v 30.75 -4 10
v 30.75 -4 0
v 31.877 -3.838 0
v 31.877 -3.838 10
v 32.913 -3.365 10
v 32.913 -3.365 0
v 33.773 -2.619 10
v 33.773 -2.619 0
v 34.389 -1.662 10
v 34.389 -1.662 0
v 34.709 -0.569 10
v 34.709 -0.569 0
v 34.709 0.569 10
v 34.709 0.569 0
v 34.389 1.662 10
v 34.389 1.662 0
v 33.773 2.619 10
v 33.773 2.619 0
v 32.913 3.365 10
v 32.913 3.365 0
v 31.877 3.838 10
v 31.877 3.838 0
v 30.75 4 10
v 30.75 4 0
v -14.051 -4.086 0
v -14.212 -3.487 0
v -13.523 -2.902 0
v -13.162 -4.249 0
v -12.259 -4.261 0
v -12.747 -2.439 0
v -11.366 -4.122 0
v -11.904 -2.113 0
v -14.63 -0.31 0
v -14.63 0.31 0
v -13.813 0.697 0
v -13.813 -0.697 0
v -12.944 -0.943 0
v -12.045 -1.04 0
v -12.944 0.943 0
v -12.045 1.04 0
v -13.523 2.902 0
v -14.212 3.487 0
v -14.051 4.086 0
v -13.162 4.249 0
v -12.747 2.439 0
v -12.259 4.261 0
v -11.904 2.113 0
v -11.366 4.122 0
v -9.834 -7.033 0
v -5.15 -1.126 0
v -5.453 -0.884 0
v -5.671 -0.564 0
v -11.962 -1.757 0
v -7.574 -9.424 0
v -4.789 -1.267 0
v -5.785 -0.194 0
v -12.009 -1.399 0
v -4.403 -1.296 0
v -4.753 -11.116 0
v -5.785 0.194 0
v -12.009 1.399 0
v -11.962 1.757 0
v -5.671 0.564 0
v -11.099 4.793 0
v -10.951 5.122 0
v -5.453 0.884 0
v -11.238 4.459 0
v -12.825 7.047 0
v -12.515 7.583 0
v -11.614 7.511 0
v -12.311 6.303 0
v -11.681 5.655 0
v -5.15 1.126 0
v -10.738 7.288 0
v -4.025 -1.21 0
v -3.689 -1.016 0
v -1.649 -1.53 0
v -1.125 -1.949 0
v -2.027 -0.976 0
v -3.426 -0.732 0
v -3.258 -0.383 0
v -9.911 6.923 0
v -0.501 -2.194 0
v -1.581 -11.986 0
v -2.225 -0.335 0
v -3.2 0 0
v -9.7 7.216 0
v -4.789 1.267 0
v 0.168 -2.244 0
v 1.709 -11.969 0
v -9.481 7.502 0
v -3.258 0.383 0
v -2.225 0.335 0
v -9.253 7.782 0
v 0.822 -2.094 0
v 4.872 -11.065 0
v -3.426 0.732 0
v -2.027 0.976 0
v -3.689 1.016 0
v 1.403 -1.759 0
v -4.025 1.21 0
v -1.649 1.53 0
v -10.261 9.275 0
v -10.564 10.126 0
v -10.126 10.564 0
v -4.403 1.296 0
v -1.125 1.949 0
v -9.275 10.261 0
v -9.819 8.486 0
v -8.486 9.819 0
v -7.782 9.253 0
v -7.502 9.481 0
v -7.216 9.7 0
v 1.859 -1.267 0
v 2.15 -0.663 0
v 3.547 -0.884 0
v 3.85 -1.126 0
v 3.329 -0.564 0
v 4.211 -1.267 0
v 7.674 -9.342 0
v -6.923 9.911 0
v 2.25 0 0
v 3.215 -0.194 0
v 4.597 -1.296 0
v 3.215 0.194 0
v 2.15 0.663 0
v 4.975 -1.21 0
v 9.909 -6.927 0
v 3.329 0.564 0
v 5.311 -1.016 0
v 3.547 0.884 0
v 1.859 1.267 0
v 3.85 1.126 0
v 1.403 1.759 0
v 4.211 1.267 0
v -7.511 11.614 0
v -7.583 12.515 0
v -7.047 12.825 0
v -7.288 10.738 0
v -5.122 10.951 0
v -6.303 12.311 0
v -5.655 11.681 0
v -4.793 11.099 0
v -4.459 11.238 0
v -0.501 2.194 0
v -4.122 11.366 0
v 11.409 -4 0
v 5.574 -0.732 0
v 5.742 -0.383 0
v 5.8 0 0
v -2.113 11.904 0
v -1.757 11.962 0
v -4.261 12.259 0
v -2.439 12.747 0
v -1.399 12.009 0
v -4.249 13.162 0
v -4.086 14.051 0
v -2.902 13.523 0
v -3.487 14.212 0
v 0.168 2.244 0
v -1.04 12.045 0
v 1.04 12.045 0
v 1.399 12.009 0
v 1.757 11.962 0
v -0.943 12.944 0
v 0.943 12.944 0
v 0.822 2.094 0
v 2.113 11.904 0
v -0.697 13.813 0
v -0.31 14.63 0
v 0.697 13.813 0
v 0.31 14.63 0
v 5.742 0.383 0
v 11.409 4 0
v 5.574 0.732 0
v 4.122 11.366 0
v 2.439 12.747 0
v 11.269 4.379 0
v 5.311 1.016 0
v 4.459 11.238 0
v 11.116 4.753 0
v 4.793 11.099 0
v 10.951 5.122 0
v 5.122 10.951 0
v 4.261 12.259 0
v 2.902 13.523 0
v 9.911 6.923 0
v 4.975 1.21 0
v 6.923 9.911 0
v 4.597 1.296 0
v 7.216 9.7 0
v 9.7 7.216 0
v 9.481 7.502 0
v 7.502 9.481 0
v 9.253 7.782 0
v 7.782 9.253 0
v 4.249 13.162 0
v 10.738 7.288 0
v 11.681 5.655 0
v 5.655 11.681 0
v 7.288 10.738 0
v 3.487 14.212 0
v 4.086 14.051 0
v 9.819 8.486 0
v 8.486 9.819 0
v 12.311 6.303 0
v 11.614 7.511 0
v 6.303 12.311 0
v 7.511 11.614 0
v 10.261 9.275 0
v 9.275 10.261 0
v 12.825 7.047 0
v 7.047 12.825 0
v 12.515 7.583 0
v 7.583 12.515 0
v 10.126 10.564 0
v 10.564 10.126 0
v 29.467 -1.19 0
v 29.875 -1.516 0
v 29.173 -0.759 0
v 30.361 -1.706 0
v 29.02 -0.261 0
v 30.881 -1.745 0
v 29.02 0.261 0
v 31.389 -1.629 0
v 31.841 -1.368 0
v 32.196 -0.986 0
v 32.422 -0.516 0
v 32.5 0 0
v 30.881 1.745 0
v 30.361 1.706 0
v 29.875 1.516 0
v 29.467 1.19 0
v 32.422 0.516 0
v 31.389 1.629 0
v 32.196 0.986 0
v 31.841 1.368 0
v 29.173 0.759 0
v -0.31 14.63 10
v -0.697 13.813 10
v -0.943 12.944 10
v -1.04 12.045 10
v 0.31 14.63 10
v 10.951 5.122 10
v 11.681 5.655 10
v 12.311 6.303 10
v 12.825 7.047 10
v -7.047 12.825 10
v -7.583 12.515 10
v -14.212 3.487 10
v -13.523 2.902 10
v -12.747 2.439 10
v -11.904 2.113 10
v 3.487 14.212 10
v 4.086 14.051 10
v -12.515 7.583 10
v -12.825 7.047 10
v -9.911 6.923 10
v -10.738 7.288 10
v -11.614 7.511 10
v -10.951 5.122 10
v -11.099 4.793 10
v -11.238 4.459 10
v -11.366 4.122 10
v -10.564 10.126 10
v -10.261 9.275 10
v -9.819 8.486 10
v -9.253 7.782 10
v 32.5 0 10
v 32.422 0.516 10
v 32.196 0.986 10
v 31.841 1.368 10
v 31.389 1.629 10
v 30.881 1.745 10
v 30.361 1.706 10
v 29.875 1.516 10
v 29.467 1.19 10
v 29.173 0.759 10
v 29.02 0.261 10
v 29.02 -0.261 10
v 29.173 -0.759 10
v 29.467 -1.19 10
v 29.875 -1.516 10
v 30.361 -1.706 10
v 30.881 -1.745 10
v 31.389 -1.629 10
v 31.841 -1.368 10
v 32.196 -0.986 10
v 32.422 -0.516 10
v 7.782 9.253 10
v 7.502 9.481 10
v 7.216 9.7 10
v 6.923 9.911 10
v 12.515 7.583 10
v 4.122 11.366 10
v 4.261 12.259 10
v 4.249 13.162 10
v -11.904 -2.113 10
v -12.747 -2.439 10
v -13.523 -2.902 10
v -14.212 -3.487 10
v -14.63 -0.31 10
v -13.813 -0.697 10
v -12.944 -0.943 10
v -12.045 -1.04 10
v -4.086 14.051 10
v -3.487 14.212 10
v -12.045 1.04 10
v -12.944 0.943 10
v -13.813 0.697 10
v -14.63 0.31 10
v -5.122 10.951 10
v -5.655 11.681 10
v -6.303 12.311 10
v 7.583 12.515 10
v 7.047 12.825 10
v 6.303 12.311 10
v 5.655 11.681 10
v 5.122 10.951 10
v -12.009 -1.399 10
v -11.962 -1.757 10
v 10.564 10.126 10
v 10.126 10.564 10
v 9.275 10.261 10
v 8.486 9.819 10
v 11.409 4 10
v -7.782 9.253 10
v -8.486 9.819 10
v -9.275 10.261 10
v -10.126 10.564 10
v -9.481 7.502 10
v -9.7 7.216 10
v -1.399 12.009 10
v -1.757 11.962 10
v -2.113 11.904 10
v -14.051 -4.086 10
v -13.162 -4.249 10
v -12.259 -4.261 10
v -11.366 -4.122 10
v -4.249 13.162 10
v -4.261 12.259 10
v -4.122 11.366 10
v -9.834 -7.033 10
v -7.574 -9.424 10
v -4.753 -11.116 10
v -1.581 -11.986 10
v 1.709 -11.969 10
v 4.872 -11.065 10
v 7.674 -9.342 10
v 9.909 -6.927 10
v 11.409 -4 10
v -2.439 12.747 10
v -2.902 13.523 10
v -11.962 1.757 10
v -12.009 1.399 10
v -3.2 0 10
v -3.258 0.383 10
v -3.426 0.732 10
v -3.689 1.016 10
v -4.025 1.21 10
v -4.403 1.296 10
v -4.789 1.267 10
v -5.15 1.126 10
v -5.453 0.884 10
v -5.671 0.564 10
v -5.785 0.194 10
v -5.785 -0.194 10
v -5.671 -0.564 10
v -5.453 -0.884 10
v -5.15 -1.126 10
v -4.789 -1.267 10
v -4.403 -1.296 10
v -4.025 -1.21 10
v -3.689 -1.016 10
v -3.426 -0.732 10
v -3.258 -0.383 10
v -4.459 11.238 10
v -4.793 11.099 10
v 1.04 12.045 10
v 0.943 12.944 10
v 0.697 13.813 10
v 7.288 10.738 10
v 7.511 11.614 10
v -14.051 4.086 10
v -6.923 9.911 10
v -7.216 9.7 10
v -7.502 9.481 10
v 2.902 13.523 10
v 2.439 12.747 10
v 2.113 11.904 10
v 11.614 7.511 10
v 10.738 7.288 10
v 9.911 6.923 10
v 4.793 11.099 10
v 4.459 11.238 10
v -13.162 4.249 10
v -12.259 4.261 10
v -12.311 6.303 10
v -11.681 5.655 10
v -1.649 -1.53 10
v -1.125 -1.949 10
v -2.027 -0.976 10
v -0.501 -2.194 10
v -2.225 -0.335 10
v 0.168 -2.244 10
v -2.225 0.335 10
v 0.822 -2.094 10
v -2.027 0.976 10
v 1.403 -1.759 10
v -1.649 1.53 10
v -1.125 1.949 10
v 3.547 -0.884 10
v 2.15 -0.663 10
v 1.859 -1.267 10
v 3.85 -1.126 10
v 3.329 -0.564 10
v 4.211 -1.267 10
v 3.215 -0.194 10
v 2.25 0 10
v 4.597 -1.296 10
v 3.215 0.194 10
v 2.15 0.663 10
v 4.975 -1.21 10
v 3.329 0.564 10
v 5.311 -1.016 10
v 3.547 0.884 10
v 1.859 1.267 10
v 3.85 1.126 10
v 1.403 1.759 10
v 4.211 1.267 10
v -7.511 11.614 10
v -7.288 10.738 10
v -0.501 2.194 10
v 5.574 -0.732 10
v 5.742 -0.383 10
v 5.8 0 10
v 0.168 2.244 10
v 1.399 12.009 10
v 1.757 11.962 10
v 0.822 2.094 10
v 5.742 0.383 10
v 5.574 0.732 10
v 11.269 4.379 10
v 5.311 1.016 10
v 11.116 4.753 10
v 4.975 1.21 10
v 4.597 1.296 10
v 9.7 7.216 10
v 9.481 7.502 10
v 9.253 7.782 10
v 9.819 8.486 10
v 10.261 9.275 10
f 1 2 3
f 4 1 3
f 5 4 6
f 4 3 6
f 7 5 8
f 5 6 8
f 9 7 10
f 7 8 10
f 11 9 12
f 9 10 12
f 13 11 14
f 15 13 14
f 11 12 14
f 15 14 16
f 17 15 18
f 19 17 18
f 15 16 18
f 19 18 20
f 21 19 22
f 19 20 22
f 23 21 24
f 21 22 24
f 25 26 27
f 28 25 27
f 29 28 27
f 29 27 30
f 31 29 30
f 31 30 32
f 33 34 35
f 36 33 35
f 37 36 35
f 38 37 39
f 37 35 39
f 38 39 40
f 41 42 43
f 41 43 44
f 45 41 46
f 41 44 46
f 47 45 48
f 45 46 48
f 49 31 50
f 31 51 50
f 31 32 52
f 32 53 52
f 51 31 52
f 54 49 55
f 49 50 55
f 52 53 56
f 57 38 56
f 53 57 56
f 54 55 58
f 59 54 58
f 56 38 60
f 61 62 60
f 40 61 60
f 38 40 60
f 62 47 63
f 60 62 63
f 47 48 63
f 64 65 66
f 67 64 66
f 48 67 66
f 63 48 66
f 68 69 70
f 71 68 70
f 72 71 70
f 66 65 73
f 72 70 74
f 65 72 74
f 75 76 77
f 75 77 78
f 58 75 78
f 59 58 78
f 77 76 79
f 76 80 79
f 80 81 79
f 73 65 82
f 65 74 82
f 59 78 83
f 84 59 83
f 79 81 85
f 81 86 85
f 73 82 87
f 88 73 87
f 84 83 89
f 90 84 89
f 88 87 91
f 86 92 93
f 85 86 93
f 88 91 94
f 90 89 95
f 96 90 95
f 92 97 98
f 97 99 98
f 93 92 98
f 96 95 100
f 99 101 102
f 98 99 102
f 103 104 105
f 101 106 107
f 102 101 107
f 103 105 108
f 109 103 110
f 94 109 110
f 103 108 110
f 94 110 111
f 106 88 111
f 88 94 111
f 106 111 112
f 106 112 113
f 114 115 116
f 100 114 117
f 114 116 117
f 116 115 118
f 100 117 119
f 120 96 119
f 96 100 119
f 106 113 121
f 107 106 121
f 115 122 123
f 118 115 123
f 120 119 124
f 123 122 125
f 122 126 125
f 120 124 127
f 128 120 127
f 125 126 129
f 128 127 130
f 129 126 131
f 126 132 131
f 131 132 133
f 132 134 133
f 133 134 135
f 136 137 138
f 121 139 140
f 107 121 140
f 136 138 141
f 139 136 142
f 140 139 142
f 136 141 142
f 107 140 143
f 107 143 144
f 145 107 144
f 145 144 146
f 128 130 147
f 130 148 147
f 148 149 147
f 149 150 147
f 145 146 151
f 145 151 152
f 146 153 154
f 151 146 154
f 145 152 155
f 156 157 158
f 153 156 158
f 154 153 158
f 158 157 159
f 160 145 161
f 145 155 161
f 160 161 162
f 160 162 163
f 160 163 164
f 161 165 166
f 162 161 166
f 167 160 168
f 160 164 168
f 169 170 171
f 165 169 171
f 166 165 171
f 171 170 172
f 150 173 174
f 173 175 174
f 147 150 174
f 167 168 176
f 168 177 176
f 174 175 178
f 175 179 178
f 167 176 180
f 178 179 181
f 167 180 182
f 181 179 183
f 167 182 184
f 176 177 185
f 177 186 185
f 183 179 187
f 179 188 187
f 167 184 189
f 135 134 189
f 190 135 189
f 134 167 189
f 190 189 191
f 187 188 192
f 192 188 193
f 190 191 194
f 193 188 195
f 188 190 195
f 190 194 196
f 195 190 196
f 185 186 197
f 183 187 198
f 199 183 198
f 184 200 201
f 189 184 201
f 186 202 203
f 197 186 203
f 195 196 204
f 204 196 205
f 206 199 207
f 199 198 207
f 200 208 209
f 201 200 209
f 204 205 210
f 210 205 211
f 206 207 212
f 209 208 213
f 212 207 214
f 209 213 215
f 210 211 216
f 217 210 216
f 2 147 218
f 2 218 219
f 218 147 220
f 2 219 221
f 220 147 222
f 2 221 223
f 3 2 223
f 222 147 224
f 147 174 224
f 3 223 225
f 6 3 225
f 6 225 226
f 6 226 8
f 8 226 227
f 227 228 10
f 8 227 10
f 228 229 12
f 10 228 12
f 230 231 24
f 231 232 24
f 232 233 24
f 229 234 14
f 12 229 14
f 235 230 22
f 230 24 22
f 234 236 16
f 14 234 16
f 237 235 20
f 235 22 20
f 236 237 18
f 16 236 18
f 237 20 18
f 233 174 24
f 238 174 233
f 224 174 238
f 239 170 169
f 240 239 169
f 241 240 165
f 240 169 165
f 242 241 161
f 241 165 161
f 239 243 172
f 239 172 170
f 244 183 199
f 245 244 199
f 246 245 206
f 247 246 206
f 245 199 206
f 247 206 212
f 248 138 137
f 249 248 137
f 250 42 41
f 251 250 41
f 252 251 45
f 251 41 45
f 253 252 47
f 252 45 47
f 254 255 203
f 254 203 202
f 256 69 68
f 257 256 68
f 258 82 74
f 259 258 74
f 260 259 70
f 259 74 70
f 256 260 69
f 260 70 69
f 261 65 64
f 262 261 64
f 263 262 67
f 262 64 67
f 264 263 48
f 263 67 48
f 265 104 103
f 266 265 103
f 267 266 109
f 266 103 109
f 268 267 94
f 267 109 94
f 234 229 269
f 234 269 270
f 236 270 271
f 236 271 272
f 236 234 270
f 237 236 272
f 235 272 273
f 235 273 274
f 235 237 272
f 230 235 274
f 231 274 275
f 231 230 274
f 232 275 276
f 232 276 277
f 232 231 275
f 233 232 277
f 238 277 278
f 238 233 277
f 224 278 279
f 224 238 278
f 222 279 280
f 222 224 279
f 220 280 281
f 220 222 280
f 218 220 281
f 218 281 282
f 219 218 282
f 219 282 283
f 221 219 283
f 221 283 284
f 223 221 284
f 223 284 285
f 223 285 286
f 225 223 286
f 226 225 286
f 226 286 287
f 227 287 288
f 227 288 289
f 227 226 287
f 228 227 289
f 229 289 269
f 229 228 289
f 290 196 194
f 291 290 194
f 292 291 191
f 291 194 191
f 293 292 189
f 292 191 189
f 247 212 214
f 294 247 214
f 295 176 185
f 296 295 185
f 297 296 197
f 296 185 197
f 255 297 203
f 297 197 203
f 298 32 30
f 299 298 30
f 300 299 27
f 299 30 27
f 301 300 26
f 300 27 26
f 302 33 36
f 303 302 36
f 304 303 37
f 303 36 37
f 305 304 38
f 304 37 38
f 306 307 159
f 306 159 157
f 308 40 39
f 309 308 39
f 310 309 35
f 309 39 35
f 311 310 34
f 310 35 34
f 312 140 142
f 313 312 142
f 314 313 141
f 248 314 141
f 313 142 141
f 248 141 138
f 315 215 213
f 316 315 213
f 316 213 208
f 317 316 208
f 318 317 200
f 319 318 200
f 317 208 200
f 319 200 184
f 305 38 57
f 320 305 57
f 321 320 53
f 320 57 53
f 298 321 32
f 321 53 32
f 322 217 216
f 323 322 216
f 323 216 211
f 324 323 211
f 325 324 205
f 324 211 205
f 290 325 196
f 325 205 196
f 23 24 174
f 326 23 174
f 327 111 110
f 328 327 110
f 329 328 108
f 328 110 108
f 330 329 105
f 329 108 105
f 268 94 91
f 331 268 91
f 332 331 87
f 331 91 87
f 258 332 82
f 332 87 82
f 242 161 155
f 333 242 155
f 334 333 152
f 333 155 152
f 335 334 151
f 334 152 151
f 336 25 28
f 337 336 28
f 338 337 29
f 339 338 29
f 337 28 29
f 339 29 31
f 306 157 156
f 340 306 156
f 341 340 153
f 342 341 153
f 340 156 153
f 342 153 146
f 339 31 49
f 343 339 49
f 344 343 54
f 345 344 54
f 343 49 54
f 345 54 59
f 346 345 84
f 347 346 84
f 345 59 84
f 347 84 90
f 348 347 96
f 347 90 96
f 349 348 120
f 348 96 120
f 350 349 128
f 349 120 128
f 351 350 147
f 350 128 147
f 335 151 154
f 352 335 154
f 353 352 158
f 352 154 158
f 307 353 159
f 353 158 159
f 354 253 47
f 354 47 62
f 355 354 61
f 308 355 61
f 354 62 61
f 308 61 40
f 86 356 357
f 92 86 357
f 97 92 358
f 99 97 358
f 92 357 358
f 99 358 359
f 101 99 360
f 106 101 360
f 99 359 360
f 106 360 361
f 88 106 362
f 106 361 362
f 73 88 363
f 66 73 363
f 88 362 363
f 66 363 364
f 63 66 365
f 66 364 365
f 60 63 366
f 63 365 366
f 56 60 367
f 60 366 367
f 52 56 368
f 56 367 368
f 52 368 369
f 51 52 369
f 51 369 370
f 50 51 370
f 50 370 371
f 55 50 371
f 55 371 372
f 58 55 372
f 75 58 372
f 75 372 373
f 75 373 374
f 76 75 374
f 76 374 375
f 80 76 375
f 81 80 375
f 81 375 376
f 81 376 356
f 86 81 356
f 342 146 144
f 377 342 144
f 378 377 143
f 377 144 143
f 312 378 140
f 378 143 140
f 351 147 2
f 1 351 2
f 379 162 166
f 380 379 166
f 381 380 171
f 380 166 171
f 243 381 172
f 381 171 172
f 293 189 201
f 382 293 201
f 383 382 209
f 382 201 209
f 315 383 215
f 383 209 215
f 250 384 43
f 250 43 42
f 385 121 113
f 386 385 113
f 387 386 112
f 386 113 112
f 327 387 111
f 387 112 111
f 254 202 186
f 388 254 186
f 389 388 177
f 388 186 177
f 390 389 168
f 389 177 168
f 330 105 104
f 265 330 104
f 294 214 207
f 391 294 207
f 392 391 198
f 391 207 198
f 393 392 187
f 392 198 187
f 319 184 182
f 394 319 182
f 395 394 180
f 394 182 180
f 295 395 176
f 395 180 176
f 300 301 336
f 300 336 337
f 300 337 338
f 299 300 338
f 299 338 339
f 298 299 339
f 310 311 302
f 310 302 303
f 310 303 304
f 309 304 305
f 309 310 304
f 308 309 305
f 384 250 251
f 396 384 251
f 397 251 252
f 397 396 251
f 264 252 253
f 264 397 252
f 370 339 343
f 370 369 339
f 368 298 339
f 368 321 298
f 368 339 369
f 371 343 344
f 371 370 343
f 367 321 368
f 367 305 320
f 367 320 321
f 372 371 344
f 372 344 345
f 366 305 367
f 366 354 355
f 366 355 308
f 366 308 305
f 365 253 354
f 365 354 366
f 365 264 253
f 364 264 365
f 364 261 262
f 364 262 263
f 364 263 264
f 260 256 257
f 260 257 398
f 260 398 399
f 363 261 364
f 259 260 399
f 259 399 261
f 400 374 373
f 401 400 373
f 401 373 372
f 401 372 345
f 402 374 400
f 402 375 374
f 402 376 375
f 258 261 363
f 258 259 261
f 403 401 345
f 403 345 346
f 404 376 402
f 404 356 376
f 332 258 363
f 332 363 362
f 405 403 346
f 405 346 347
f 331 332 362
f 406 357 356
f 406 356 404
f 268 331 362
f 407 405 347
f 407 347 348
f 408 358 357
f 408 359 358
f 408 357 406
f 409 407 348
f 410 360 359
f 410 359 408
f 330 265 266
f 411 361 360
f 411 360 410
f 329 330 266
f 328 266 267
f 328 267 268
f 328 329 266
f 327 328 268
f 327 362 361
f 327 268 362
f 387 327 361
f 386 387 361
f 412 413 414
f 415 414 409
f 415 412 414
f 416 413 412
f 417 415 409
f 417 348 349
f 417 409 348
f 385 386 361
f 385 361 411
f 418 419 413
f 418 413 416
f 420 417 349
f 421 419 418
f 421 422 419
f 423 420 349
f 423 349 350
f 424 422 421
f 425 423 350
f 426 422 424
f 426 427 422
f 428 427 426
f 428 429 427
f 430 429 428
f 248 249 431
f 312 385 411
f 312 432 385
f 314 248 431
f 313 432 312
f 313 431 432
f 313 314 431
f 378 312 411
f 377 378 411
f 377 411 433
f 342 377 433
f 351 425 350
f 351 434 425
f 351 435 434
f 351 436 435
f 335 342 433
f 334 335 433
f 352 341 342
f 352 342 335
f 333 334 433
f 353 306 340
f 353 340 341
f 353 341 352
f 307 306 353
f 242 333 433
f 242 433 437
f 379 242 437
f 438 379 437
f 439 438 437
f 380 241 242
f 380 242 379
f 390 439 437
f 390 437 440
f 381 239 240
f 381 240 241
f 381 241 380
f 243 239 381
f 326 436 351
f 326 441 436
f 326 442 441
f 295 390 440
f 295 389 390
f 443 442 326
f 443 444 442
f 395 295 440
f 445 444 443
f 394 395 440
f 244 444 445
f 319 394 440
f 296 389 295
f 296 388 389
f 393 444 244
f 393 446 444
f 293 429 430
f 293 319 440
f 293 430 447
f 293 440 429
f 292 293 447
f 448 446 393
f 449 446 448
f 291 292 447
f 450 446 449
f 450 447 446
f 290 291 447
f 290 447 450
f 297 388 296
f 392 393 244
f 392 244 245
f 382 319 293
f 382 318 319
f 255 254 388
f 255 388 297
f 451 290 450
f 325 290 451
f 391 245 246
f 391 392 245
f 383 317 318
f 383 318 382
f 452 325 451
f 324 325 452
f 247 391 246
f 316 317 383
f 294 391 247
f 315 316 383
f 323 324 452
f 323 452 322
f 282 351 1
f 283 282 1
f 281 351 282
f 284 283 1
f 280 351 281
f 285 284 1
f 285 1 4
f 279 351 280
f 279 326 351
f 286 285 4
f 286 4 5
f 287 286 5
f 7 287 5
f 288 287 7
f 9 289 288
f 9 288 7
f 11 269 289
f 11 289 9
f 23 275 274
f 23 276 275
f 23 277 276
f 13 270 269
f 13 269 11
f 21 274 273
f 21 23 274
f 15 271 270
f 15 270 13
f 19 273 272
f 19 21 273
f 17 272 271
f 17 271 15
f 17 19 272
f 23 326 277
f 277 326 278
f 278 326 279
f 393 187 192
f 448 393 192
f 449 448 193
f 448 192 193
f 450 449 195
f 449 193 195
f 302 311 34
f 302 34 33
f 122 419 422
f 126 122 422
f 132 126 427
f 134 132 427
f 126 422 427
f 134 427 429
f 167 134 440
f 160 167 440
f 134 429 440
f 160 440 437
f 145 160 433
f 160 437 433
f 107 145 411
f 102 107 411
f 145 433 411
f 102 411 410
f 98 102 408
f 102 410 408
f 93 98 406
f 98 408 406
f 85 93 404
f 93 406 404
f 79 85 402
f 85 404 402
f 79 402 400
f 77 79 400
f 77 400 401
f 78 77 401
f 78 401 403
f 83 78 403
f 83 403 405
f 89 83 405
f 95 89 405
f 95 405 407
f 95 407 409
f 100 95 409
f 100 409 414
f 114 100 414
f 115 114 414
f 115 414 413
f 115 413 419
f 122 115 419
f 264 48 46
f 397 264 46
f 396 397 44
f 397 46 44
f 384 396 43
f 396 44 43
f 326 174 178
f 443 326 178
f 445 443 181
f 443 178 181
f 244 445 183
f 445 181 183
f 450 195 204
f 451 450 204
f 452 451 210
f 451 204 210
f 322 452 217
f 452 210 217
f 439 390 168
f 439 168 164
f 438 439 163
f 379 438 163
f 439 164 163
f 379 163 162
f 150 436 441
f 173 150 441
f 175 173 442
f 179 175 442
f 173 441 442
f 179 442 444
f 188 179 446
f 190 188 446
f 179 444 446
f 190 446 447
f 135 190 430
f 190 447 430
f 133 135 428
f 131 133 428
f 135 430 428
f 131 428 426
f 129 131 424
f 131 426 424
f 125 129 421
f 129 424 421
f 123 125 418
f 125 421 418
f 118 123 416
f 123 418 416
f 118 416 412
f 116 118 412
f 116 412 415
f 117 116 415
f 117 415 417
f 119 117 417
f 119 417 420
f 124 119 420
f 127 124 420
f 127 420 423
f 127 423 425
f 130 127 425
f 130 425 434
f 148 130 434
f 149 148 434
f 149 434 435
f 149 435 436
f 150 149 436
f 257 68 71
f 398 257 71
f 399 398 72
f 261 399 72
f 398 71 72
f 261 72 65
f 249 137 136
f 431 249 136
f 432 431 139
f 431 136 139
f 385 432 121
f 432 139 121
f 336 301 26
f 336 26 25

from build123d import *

# Parameters (mm, degrees)
SKETCH1_R           = 1.75
BOSS_EXTRUDE1_DEPTH = 10
SKETCH2_R           = 1.3
SKETCH2_R_2         = 2.25
CUT_EXTRUDE1_DEPTH  = 40.007683858


with BuildPart() as part:
    # Sketch1 → Boss-Extrude1 (new body)
    with BuildSketch(Plane.XY):
        with BuildLine():
            Line((0.31, 14.63), (-0.31, 14.63))
            ThreePointArc((-0.31, 14.63), (-0.838273314, 13.383704325), (-1.04, 12.04518576))
            ThreePointArc((-1.04, 12.04518576), (-1.578061664, 11.986568374), (-2.112960617, 11.903927815))
            ThreePointArc((-2.112960617, 11.903927815), (-2.65424773, 13.144626757), (-3.487085624, 14.211728743))
            Line((-3.487085624, 14.211728743), (-4.085959636, 14.051260935))
            ThreePointArc((-4.085959636, 14.051260935), (-4.273667417, 12.71070456), (-4.122086336, 11.365584201))
            ThreePointArc((-4.122086336, 11.365584201), (-4.626642697, 11.169703548), (-5.12192646, 10.951436862))
            ThreePointArc((-5.12192646, 10.951436862), (-5.965886177, 12.009764599), (-7.046532125, 12.824951657))
            Line((-7.046532125, 12.824951657), (-7.583467875, 12.514951657))
            ThreePointArc((-7.583467875, 12.514951657), (-7.417818147, 11.171491285), (-6.9232593, 9.911436862))
            ThreePointArc((-6.9232593, 9.911436862), (-7.359925677, 9.591641884), (-7.781841479, 9.252623584))
            ThreePointArc((-7.781841479, 9.252623584), (-8.870959341, 10.05645683), (-10.125769107, 10.564175311))
            Line((-10.125769107, 10.564175311), (-10.564175311, 10.125769107))
            ThreePointArc((-10.564175311, 10.125769107), (-10.05645683, 8.870959341), (-9.252623584, 7.781841479))
            ThreePointArc((-9.252623584, 7.781841479), (-9.591641884, 7.359925677), (-9.911436862, 6.9232593))
            ThreePointArc((-9.911436862, 6.9232593), (-11.171491285, 7.417818147), (-12.514951657, 7.583467875))
            Line((-12.514951657, 7.583467875), (-12.824951657, 7.046532125))
            ThreePointArc((-12.824951657, 7.046532125), (-12.009764599, 5.965886177), (-10.951436862, 5.12192646))
            ThreePointArc((-10.951436862, 5.12192646), (-11.169703548, 4.626642697), (-11.365584201, 4.122086336))
            ThreePointArc((-11.365584201, 4.122086336), (-12.71070456, 4.273667417), (-14.051260935, 4.085959636))
            Line((-14.051260935, 4.085959636), (-14.211728743, 3.487085624))
            ThreePointArc((-14.211728743, 3.487085624), (-13.144626757, 2.65424773), (-11.903927815, 2.112960617))
            ThreePointArc((-11.903927815, 2.112960617), (-11.986568374, 1.578061664), (-12.04518576, 1.04))
            ThreePointArc((-12.04518576, 1.04), (-13.383704325, 0.838273314), (-14.63, 0.31))
            Line((-14.63, 0.31), (-14.63, -0.31))
            ThreePointArc((-14.63, -0.31), (-13.383704325, -0.838273314), (-12.04518576, -1.04))
            ThreePointArc((-12.04518576, -1.04), (-11.986568374, -1.578061664), (-11.903927815, -2.112960617))
            ThreePointArc((-11.903927815, -2.112960617), (-13.144626757, -2.65424773), (-14.211728743, -3.487085624))
            Line((-14.211728743, -3.487085624), (-14.051260935, -4.085959636))
            ThreePointArc((-14.051260935, -4.085959636), (-12.71070456, -4.273667417), (-11.365584201, -4.122086336))
            ThreePointArc((-11.365584201, -4.122086336), (0.064808849, -12.089826294), (11.409123542, -4))
            Line((11.409123542, -4), (30.75, -4))
            ThreePointArc((30.75, -4), (34.75, 0), (30.75, 4))
            Line((30.75, 4), (11.409123542, 4))
            ThreePointArc((11.409123542, 4), (11.194344337, 4.566700654), (10.951436862, 5.12192646))
            ThreePointArc((10.951436862, 5.12192646), (12.009764599, 5.965886177), (12.824951657, 7.046532125))
            Line((12.824951657, 7.046532125), (12.514951657, 7.583467875))
            ThreePointArc((12.514951657, 7.583467875), (11.171491285, 7.417818147), (9.911436862, 6.9232593))
            ThreePointArc((9.911436862, 6.9232593), (9.591641884, 7.359925677), (9.252623584, 7.781841479))
            ThreePointArc((9.252623584, 7.781841479), (10.05645683, 8.870959341), (10.564175311, 10.125769107))
            Line((10.564175311, 10.125769107), (10.125769107, 10.564175311))
            ThreePointArc((10.125769107, 10.564175311), (8.870959341, 10.05645683), (7.781841479, 9.252623584))
            ThreePointArc((7.781841479, 9.252623584), (7.359925677, 9.591641884), (6.9232593, 9.911436862))
            ThreePointArc((6.9232593, 9.911436862), (7.417818147, 11.171491285), (7.583467875, 12.514951657))
            Line((7.583467875, 12.514951657), (7.046532125, 12.824951657))
            ThreePointArc((7.046532125, 12.824951657), (5.965886177, 12.009764599), (5.12192646, 10.951436862))
            ThreePointArc((5.12192646, 10.951436862), (4.626642697, 11.169703548), (4.122086336, 11.365584201))
            ThreePointArc((4.122086336, 11.365584201), (4.273667417, 12.71070456), (4.085959636, 14.051260935))
            Line((4.085959636, 14.051260935), (3.487085624, 14.211728743))
            ThreePointArc((3.487085624, 14.211728743), (2.65424773, 13.144626757), (2.112960617, 11.903927815))
            ThreePointArc((2.112960617, 11.903927815), (1.578061664, 11.986568374), (1.04, 12.04518576))
            ThreePointArc((1.04, 12.04518576), (0.838273314, 13.383704325), (0.31, 14.63))
        make_face()
        Circle(SKETCH1_R, mode=Mode.SUBTRACT)
        with Locations((30.75, 0)):
            Circle(SKETCH1_R, mode=Mode.SUBTRACT)
    extrude(amount=BOSS_EXTRUDE1_DEPTH)

    # Sketch2 → Cut-Extrude1 (cut, through all)
    with BuildSketch(Plane.XY.offset(10)):
        with Locations((-4.5, 0)):
            Circle(SKETCH2_R)
        with Locations((4.5, 0)):
            Circle(SKETCH2_R)
        Circle(SKETCH2_R_2)
    extrude(amount=-CUT_EXTRUDE1_DEPTH, mode=Mode.SUBTRACT)


solid = part.part
